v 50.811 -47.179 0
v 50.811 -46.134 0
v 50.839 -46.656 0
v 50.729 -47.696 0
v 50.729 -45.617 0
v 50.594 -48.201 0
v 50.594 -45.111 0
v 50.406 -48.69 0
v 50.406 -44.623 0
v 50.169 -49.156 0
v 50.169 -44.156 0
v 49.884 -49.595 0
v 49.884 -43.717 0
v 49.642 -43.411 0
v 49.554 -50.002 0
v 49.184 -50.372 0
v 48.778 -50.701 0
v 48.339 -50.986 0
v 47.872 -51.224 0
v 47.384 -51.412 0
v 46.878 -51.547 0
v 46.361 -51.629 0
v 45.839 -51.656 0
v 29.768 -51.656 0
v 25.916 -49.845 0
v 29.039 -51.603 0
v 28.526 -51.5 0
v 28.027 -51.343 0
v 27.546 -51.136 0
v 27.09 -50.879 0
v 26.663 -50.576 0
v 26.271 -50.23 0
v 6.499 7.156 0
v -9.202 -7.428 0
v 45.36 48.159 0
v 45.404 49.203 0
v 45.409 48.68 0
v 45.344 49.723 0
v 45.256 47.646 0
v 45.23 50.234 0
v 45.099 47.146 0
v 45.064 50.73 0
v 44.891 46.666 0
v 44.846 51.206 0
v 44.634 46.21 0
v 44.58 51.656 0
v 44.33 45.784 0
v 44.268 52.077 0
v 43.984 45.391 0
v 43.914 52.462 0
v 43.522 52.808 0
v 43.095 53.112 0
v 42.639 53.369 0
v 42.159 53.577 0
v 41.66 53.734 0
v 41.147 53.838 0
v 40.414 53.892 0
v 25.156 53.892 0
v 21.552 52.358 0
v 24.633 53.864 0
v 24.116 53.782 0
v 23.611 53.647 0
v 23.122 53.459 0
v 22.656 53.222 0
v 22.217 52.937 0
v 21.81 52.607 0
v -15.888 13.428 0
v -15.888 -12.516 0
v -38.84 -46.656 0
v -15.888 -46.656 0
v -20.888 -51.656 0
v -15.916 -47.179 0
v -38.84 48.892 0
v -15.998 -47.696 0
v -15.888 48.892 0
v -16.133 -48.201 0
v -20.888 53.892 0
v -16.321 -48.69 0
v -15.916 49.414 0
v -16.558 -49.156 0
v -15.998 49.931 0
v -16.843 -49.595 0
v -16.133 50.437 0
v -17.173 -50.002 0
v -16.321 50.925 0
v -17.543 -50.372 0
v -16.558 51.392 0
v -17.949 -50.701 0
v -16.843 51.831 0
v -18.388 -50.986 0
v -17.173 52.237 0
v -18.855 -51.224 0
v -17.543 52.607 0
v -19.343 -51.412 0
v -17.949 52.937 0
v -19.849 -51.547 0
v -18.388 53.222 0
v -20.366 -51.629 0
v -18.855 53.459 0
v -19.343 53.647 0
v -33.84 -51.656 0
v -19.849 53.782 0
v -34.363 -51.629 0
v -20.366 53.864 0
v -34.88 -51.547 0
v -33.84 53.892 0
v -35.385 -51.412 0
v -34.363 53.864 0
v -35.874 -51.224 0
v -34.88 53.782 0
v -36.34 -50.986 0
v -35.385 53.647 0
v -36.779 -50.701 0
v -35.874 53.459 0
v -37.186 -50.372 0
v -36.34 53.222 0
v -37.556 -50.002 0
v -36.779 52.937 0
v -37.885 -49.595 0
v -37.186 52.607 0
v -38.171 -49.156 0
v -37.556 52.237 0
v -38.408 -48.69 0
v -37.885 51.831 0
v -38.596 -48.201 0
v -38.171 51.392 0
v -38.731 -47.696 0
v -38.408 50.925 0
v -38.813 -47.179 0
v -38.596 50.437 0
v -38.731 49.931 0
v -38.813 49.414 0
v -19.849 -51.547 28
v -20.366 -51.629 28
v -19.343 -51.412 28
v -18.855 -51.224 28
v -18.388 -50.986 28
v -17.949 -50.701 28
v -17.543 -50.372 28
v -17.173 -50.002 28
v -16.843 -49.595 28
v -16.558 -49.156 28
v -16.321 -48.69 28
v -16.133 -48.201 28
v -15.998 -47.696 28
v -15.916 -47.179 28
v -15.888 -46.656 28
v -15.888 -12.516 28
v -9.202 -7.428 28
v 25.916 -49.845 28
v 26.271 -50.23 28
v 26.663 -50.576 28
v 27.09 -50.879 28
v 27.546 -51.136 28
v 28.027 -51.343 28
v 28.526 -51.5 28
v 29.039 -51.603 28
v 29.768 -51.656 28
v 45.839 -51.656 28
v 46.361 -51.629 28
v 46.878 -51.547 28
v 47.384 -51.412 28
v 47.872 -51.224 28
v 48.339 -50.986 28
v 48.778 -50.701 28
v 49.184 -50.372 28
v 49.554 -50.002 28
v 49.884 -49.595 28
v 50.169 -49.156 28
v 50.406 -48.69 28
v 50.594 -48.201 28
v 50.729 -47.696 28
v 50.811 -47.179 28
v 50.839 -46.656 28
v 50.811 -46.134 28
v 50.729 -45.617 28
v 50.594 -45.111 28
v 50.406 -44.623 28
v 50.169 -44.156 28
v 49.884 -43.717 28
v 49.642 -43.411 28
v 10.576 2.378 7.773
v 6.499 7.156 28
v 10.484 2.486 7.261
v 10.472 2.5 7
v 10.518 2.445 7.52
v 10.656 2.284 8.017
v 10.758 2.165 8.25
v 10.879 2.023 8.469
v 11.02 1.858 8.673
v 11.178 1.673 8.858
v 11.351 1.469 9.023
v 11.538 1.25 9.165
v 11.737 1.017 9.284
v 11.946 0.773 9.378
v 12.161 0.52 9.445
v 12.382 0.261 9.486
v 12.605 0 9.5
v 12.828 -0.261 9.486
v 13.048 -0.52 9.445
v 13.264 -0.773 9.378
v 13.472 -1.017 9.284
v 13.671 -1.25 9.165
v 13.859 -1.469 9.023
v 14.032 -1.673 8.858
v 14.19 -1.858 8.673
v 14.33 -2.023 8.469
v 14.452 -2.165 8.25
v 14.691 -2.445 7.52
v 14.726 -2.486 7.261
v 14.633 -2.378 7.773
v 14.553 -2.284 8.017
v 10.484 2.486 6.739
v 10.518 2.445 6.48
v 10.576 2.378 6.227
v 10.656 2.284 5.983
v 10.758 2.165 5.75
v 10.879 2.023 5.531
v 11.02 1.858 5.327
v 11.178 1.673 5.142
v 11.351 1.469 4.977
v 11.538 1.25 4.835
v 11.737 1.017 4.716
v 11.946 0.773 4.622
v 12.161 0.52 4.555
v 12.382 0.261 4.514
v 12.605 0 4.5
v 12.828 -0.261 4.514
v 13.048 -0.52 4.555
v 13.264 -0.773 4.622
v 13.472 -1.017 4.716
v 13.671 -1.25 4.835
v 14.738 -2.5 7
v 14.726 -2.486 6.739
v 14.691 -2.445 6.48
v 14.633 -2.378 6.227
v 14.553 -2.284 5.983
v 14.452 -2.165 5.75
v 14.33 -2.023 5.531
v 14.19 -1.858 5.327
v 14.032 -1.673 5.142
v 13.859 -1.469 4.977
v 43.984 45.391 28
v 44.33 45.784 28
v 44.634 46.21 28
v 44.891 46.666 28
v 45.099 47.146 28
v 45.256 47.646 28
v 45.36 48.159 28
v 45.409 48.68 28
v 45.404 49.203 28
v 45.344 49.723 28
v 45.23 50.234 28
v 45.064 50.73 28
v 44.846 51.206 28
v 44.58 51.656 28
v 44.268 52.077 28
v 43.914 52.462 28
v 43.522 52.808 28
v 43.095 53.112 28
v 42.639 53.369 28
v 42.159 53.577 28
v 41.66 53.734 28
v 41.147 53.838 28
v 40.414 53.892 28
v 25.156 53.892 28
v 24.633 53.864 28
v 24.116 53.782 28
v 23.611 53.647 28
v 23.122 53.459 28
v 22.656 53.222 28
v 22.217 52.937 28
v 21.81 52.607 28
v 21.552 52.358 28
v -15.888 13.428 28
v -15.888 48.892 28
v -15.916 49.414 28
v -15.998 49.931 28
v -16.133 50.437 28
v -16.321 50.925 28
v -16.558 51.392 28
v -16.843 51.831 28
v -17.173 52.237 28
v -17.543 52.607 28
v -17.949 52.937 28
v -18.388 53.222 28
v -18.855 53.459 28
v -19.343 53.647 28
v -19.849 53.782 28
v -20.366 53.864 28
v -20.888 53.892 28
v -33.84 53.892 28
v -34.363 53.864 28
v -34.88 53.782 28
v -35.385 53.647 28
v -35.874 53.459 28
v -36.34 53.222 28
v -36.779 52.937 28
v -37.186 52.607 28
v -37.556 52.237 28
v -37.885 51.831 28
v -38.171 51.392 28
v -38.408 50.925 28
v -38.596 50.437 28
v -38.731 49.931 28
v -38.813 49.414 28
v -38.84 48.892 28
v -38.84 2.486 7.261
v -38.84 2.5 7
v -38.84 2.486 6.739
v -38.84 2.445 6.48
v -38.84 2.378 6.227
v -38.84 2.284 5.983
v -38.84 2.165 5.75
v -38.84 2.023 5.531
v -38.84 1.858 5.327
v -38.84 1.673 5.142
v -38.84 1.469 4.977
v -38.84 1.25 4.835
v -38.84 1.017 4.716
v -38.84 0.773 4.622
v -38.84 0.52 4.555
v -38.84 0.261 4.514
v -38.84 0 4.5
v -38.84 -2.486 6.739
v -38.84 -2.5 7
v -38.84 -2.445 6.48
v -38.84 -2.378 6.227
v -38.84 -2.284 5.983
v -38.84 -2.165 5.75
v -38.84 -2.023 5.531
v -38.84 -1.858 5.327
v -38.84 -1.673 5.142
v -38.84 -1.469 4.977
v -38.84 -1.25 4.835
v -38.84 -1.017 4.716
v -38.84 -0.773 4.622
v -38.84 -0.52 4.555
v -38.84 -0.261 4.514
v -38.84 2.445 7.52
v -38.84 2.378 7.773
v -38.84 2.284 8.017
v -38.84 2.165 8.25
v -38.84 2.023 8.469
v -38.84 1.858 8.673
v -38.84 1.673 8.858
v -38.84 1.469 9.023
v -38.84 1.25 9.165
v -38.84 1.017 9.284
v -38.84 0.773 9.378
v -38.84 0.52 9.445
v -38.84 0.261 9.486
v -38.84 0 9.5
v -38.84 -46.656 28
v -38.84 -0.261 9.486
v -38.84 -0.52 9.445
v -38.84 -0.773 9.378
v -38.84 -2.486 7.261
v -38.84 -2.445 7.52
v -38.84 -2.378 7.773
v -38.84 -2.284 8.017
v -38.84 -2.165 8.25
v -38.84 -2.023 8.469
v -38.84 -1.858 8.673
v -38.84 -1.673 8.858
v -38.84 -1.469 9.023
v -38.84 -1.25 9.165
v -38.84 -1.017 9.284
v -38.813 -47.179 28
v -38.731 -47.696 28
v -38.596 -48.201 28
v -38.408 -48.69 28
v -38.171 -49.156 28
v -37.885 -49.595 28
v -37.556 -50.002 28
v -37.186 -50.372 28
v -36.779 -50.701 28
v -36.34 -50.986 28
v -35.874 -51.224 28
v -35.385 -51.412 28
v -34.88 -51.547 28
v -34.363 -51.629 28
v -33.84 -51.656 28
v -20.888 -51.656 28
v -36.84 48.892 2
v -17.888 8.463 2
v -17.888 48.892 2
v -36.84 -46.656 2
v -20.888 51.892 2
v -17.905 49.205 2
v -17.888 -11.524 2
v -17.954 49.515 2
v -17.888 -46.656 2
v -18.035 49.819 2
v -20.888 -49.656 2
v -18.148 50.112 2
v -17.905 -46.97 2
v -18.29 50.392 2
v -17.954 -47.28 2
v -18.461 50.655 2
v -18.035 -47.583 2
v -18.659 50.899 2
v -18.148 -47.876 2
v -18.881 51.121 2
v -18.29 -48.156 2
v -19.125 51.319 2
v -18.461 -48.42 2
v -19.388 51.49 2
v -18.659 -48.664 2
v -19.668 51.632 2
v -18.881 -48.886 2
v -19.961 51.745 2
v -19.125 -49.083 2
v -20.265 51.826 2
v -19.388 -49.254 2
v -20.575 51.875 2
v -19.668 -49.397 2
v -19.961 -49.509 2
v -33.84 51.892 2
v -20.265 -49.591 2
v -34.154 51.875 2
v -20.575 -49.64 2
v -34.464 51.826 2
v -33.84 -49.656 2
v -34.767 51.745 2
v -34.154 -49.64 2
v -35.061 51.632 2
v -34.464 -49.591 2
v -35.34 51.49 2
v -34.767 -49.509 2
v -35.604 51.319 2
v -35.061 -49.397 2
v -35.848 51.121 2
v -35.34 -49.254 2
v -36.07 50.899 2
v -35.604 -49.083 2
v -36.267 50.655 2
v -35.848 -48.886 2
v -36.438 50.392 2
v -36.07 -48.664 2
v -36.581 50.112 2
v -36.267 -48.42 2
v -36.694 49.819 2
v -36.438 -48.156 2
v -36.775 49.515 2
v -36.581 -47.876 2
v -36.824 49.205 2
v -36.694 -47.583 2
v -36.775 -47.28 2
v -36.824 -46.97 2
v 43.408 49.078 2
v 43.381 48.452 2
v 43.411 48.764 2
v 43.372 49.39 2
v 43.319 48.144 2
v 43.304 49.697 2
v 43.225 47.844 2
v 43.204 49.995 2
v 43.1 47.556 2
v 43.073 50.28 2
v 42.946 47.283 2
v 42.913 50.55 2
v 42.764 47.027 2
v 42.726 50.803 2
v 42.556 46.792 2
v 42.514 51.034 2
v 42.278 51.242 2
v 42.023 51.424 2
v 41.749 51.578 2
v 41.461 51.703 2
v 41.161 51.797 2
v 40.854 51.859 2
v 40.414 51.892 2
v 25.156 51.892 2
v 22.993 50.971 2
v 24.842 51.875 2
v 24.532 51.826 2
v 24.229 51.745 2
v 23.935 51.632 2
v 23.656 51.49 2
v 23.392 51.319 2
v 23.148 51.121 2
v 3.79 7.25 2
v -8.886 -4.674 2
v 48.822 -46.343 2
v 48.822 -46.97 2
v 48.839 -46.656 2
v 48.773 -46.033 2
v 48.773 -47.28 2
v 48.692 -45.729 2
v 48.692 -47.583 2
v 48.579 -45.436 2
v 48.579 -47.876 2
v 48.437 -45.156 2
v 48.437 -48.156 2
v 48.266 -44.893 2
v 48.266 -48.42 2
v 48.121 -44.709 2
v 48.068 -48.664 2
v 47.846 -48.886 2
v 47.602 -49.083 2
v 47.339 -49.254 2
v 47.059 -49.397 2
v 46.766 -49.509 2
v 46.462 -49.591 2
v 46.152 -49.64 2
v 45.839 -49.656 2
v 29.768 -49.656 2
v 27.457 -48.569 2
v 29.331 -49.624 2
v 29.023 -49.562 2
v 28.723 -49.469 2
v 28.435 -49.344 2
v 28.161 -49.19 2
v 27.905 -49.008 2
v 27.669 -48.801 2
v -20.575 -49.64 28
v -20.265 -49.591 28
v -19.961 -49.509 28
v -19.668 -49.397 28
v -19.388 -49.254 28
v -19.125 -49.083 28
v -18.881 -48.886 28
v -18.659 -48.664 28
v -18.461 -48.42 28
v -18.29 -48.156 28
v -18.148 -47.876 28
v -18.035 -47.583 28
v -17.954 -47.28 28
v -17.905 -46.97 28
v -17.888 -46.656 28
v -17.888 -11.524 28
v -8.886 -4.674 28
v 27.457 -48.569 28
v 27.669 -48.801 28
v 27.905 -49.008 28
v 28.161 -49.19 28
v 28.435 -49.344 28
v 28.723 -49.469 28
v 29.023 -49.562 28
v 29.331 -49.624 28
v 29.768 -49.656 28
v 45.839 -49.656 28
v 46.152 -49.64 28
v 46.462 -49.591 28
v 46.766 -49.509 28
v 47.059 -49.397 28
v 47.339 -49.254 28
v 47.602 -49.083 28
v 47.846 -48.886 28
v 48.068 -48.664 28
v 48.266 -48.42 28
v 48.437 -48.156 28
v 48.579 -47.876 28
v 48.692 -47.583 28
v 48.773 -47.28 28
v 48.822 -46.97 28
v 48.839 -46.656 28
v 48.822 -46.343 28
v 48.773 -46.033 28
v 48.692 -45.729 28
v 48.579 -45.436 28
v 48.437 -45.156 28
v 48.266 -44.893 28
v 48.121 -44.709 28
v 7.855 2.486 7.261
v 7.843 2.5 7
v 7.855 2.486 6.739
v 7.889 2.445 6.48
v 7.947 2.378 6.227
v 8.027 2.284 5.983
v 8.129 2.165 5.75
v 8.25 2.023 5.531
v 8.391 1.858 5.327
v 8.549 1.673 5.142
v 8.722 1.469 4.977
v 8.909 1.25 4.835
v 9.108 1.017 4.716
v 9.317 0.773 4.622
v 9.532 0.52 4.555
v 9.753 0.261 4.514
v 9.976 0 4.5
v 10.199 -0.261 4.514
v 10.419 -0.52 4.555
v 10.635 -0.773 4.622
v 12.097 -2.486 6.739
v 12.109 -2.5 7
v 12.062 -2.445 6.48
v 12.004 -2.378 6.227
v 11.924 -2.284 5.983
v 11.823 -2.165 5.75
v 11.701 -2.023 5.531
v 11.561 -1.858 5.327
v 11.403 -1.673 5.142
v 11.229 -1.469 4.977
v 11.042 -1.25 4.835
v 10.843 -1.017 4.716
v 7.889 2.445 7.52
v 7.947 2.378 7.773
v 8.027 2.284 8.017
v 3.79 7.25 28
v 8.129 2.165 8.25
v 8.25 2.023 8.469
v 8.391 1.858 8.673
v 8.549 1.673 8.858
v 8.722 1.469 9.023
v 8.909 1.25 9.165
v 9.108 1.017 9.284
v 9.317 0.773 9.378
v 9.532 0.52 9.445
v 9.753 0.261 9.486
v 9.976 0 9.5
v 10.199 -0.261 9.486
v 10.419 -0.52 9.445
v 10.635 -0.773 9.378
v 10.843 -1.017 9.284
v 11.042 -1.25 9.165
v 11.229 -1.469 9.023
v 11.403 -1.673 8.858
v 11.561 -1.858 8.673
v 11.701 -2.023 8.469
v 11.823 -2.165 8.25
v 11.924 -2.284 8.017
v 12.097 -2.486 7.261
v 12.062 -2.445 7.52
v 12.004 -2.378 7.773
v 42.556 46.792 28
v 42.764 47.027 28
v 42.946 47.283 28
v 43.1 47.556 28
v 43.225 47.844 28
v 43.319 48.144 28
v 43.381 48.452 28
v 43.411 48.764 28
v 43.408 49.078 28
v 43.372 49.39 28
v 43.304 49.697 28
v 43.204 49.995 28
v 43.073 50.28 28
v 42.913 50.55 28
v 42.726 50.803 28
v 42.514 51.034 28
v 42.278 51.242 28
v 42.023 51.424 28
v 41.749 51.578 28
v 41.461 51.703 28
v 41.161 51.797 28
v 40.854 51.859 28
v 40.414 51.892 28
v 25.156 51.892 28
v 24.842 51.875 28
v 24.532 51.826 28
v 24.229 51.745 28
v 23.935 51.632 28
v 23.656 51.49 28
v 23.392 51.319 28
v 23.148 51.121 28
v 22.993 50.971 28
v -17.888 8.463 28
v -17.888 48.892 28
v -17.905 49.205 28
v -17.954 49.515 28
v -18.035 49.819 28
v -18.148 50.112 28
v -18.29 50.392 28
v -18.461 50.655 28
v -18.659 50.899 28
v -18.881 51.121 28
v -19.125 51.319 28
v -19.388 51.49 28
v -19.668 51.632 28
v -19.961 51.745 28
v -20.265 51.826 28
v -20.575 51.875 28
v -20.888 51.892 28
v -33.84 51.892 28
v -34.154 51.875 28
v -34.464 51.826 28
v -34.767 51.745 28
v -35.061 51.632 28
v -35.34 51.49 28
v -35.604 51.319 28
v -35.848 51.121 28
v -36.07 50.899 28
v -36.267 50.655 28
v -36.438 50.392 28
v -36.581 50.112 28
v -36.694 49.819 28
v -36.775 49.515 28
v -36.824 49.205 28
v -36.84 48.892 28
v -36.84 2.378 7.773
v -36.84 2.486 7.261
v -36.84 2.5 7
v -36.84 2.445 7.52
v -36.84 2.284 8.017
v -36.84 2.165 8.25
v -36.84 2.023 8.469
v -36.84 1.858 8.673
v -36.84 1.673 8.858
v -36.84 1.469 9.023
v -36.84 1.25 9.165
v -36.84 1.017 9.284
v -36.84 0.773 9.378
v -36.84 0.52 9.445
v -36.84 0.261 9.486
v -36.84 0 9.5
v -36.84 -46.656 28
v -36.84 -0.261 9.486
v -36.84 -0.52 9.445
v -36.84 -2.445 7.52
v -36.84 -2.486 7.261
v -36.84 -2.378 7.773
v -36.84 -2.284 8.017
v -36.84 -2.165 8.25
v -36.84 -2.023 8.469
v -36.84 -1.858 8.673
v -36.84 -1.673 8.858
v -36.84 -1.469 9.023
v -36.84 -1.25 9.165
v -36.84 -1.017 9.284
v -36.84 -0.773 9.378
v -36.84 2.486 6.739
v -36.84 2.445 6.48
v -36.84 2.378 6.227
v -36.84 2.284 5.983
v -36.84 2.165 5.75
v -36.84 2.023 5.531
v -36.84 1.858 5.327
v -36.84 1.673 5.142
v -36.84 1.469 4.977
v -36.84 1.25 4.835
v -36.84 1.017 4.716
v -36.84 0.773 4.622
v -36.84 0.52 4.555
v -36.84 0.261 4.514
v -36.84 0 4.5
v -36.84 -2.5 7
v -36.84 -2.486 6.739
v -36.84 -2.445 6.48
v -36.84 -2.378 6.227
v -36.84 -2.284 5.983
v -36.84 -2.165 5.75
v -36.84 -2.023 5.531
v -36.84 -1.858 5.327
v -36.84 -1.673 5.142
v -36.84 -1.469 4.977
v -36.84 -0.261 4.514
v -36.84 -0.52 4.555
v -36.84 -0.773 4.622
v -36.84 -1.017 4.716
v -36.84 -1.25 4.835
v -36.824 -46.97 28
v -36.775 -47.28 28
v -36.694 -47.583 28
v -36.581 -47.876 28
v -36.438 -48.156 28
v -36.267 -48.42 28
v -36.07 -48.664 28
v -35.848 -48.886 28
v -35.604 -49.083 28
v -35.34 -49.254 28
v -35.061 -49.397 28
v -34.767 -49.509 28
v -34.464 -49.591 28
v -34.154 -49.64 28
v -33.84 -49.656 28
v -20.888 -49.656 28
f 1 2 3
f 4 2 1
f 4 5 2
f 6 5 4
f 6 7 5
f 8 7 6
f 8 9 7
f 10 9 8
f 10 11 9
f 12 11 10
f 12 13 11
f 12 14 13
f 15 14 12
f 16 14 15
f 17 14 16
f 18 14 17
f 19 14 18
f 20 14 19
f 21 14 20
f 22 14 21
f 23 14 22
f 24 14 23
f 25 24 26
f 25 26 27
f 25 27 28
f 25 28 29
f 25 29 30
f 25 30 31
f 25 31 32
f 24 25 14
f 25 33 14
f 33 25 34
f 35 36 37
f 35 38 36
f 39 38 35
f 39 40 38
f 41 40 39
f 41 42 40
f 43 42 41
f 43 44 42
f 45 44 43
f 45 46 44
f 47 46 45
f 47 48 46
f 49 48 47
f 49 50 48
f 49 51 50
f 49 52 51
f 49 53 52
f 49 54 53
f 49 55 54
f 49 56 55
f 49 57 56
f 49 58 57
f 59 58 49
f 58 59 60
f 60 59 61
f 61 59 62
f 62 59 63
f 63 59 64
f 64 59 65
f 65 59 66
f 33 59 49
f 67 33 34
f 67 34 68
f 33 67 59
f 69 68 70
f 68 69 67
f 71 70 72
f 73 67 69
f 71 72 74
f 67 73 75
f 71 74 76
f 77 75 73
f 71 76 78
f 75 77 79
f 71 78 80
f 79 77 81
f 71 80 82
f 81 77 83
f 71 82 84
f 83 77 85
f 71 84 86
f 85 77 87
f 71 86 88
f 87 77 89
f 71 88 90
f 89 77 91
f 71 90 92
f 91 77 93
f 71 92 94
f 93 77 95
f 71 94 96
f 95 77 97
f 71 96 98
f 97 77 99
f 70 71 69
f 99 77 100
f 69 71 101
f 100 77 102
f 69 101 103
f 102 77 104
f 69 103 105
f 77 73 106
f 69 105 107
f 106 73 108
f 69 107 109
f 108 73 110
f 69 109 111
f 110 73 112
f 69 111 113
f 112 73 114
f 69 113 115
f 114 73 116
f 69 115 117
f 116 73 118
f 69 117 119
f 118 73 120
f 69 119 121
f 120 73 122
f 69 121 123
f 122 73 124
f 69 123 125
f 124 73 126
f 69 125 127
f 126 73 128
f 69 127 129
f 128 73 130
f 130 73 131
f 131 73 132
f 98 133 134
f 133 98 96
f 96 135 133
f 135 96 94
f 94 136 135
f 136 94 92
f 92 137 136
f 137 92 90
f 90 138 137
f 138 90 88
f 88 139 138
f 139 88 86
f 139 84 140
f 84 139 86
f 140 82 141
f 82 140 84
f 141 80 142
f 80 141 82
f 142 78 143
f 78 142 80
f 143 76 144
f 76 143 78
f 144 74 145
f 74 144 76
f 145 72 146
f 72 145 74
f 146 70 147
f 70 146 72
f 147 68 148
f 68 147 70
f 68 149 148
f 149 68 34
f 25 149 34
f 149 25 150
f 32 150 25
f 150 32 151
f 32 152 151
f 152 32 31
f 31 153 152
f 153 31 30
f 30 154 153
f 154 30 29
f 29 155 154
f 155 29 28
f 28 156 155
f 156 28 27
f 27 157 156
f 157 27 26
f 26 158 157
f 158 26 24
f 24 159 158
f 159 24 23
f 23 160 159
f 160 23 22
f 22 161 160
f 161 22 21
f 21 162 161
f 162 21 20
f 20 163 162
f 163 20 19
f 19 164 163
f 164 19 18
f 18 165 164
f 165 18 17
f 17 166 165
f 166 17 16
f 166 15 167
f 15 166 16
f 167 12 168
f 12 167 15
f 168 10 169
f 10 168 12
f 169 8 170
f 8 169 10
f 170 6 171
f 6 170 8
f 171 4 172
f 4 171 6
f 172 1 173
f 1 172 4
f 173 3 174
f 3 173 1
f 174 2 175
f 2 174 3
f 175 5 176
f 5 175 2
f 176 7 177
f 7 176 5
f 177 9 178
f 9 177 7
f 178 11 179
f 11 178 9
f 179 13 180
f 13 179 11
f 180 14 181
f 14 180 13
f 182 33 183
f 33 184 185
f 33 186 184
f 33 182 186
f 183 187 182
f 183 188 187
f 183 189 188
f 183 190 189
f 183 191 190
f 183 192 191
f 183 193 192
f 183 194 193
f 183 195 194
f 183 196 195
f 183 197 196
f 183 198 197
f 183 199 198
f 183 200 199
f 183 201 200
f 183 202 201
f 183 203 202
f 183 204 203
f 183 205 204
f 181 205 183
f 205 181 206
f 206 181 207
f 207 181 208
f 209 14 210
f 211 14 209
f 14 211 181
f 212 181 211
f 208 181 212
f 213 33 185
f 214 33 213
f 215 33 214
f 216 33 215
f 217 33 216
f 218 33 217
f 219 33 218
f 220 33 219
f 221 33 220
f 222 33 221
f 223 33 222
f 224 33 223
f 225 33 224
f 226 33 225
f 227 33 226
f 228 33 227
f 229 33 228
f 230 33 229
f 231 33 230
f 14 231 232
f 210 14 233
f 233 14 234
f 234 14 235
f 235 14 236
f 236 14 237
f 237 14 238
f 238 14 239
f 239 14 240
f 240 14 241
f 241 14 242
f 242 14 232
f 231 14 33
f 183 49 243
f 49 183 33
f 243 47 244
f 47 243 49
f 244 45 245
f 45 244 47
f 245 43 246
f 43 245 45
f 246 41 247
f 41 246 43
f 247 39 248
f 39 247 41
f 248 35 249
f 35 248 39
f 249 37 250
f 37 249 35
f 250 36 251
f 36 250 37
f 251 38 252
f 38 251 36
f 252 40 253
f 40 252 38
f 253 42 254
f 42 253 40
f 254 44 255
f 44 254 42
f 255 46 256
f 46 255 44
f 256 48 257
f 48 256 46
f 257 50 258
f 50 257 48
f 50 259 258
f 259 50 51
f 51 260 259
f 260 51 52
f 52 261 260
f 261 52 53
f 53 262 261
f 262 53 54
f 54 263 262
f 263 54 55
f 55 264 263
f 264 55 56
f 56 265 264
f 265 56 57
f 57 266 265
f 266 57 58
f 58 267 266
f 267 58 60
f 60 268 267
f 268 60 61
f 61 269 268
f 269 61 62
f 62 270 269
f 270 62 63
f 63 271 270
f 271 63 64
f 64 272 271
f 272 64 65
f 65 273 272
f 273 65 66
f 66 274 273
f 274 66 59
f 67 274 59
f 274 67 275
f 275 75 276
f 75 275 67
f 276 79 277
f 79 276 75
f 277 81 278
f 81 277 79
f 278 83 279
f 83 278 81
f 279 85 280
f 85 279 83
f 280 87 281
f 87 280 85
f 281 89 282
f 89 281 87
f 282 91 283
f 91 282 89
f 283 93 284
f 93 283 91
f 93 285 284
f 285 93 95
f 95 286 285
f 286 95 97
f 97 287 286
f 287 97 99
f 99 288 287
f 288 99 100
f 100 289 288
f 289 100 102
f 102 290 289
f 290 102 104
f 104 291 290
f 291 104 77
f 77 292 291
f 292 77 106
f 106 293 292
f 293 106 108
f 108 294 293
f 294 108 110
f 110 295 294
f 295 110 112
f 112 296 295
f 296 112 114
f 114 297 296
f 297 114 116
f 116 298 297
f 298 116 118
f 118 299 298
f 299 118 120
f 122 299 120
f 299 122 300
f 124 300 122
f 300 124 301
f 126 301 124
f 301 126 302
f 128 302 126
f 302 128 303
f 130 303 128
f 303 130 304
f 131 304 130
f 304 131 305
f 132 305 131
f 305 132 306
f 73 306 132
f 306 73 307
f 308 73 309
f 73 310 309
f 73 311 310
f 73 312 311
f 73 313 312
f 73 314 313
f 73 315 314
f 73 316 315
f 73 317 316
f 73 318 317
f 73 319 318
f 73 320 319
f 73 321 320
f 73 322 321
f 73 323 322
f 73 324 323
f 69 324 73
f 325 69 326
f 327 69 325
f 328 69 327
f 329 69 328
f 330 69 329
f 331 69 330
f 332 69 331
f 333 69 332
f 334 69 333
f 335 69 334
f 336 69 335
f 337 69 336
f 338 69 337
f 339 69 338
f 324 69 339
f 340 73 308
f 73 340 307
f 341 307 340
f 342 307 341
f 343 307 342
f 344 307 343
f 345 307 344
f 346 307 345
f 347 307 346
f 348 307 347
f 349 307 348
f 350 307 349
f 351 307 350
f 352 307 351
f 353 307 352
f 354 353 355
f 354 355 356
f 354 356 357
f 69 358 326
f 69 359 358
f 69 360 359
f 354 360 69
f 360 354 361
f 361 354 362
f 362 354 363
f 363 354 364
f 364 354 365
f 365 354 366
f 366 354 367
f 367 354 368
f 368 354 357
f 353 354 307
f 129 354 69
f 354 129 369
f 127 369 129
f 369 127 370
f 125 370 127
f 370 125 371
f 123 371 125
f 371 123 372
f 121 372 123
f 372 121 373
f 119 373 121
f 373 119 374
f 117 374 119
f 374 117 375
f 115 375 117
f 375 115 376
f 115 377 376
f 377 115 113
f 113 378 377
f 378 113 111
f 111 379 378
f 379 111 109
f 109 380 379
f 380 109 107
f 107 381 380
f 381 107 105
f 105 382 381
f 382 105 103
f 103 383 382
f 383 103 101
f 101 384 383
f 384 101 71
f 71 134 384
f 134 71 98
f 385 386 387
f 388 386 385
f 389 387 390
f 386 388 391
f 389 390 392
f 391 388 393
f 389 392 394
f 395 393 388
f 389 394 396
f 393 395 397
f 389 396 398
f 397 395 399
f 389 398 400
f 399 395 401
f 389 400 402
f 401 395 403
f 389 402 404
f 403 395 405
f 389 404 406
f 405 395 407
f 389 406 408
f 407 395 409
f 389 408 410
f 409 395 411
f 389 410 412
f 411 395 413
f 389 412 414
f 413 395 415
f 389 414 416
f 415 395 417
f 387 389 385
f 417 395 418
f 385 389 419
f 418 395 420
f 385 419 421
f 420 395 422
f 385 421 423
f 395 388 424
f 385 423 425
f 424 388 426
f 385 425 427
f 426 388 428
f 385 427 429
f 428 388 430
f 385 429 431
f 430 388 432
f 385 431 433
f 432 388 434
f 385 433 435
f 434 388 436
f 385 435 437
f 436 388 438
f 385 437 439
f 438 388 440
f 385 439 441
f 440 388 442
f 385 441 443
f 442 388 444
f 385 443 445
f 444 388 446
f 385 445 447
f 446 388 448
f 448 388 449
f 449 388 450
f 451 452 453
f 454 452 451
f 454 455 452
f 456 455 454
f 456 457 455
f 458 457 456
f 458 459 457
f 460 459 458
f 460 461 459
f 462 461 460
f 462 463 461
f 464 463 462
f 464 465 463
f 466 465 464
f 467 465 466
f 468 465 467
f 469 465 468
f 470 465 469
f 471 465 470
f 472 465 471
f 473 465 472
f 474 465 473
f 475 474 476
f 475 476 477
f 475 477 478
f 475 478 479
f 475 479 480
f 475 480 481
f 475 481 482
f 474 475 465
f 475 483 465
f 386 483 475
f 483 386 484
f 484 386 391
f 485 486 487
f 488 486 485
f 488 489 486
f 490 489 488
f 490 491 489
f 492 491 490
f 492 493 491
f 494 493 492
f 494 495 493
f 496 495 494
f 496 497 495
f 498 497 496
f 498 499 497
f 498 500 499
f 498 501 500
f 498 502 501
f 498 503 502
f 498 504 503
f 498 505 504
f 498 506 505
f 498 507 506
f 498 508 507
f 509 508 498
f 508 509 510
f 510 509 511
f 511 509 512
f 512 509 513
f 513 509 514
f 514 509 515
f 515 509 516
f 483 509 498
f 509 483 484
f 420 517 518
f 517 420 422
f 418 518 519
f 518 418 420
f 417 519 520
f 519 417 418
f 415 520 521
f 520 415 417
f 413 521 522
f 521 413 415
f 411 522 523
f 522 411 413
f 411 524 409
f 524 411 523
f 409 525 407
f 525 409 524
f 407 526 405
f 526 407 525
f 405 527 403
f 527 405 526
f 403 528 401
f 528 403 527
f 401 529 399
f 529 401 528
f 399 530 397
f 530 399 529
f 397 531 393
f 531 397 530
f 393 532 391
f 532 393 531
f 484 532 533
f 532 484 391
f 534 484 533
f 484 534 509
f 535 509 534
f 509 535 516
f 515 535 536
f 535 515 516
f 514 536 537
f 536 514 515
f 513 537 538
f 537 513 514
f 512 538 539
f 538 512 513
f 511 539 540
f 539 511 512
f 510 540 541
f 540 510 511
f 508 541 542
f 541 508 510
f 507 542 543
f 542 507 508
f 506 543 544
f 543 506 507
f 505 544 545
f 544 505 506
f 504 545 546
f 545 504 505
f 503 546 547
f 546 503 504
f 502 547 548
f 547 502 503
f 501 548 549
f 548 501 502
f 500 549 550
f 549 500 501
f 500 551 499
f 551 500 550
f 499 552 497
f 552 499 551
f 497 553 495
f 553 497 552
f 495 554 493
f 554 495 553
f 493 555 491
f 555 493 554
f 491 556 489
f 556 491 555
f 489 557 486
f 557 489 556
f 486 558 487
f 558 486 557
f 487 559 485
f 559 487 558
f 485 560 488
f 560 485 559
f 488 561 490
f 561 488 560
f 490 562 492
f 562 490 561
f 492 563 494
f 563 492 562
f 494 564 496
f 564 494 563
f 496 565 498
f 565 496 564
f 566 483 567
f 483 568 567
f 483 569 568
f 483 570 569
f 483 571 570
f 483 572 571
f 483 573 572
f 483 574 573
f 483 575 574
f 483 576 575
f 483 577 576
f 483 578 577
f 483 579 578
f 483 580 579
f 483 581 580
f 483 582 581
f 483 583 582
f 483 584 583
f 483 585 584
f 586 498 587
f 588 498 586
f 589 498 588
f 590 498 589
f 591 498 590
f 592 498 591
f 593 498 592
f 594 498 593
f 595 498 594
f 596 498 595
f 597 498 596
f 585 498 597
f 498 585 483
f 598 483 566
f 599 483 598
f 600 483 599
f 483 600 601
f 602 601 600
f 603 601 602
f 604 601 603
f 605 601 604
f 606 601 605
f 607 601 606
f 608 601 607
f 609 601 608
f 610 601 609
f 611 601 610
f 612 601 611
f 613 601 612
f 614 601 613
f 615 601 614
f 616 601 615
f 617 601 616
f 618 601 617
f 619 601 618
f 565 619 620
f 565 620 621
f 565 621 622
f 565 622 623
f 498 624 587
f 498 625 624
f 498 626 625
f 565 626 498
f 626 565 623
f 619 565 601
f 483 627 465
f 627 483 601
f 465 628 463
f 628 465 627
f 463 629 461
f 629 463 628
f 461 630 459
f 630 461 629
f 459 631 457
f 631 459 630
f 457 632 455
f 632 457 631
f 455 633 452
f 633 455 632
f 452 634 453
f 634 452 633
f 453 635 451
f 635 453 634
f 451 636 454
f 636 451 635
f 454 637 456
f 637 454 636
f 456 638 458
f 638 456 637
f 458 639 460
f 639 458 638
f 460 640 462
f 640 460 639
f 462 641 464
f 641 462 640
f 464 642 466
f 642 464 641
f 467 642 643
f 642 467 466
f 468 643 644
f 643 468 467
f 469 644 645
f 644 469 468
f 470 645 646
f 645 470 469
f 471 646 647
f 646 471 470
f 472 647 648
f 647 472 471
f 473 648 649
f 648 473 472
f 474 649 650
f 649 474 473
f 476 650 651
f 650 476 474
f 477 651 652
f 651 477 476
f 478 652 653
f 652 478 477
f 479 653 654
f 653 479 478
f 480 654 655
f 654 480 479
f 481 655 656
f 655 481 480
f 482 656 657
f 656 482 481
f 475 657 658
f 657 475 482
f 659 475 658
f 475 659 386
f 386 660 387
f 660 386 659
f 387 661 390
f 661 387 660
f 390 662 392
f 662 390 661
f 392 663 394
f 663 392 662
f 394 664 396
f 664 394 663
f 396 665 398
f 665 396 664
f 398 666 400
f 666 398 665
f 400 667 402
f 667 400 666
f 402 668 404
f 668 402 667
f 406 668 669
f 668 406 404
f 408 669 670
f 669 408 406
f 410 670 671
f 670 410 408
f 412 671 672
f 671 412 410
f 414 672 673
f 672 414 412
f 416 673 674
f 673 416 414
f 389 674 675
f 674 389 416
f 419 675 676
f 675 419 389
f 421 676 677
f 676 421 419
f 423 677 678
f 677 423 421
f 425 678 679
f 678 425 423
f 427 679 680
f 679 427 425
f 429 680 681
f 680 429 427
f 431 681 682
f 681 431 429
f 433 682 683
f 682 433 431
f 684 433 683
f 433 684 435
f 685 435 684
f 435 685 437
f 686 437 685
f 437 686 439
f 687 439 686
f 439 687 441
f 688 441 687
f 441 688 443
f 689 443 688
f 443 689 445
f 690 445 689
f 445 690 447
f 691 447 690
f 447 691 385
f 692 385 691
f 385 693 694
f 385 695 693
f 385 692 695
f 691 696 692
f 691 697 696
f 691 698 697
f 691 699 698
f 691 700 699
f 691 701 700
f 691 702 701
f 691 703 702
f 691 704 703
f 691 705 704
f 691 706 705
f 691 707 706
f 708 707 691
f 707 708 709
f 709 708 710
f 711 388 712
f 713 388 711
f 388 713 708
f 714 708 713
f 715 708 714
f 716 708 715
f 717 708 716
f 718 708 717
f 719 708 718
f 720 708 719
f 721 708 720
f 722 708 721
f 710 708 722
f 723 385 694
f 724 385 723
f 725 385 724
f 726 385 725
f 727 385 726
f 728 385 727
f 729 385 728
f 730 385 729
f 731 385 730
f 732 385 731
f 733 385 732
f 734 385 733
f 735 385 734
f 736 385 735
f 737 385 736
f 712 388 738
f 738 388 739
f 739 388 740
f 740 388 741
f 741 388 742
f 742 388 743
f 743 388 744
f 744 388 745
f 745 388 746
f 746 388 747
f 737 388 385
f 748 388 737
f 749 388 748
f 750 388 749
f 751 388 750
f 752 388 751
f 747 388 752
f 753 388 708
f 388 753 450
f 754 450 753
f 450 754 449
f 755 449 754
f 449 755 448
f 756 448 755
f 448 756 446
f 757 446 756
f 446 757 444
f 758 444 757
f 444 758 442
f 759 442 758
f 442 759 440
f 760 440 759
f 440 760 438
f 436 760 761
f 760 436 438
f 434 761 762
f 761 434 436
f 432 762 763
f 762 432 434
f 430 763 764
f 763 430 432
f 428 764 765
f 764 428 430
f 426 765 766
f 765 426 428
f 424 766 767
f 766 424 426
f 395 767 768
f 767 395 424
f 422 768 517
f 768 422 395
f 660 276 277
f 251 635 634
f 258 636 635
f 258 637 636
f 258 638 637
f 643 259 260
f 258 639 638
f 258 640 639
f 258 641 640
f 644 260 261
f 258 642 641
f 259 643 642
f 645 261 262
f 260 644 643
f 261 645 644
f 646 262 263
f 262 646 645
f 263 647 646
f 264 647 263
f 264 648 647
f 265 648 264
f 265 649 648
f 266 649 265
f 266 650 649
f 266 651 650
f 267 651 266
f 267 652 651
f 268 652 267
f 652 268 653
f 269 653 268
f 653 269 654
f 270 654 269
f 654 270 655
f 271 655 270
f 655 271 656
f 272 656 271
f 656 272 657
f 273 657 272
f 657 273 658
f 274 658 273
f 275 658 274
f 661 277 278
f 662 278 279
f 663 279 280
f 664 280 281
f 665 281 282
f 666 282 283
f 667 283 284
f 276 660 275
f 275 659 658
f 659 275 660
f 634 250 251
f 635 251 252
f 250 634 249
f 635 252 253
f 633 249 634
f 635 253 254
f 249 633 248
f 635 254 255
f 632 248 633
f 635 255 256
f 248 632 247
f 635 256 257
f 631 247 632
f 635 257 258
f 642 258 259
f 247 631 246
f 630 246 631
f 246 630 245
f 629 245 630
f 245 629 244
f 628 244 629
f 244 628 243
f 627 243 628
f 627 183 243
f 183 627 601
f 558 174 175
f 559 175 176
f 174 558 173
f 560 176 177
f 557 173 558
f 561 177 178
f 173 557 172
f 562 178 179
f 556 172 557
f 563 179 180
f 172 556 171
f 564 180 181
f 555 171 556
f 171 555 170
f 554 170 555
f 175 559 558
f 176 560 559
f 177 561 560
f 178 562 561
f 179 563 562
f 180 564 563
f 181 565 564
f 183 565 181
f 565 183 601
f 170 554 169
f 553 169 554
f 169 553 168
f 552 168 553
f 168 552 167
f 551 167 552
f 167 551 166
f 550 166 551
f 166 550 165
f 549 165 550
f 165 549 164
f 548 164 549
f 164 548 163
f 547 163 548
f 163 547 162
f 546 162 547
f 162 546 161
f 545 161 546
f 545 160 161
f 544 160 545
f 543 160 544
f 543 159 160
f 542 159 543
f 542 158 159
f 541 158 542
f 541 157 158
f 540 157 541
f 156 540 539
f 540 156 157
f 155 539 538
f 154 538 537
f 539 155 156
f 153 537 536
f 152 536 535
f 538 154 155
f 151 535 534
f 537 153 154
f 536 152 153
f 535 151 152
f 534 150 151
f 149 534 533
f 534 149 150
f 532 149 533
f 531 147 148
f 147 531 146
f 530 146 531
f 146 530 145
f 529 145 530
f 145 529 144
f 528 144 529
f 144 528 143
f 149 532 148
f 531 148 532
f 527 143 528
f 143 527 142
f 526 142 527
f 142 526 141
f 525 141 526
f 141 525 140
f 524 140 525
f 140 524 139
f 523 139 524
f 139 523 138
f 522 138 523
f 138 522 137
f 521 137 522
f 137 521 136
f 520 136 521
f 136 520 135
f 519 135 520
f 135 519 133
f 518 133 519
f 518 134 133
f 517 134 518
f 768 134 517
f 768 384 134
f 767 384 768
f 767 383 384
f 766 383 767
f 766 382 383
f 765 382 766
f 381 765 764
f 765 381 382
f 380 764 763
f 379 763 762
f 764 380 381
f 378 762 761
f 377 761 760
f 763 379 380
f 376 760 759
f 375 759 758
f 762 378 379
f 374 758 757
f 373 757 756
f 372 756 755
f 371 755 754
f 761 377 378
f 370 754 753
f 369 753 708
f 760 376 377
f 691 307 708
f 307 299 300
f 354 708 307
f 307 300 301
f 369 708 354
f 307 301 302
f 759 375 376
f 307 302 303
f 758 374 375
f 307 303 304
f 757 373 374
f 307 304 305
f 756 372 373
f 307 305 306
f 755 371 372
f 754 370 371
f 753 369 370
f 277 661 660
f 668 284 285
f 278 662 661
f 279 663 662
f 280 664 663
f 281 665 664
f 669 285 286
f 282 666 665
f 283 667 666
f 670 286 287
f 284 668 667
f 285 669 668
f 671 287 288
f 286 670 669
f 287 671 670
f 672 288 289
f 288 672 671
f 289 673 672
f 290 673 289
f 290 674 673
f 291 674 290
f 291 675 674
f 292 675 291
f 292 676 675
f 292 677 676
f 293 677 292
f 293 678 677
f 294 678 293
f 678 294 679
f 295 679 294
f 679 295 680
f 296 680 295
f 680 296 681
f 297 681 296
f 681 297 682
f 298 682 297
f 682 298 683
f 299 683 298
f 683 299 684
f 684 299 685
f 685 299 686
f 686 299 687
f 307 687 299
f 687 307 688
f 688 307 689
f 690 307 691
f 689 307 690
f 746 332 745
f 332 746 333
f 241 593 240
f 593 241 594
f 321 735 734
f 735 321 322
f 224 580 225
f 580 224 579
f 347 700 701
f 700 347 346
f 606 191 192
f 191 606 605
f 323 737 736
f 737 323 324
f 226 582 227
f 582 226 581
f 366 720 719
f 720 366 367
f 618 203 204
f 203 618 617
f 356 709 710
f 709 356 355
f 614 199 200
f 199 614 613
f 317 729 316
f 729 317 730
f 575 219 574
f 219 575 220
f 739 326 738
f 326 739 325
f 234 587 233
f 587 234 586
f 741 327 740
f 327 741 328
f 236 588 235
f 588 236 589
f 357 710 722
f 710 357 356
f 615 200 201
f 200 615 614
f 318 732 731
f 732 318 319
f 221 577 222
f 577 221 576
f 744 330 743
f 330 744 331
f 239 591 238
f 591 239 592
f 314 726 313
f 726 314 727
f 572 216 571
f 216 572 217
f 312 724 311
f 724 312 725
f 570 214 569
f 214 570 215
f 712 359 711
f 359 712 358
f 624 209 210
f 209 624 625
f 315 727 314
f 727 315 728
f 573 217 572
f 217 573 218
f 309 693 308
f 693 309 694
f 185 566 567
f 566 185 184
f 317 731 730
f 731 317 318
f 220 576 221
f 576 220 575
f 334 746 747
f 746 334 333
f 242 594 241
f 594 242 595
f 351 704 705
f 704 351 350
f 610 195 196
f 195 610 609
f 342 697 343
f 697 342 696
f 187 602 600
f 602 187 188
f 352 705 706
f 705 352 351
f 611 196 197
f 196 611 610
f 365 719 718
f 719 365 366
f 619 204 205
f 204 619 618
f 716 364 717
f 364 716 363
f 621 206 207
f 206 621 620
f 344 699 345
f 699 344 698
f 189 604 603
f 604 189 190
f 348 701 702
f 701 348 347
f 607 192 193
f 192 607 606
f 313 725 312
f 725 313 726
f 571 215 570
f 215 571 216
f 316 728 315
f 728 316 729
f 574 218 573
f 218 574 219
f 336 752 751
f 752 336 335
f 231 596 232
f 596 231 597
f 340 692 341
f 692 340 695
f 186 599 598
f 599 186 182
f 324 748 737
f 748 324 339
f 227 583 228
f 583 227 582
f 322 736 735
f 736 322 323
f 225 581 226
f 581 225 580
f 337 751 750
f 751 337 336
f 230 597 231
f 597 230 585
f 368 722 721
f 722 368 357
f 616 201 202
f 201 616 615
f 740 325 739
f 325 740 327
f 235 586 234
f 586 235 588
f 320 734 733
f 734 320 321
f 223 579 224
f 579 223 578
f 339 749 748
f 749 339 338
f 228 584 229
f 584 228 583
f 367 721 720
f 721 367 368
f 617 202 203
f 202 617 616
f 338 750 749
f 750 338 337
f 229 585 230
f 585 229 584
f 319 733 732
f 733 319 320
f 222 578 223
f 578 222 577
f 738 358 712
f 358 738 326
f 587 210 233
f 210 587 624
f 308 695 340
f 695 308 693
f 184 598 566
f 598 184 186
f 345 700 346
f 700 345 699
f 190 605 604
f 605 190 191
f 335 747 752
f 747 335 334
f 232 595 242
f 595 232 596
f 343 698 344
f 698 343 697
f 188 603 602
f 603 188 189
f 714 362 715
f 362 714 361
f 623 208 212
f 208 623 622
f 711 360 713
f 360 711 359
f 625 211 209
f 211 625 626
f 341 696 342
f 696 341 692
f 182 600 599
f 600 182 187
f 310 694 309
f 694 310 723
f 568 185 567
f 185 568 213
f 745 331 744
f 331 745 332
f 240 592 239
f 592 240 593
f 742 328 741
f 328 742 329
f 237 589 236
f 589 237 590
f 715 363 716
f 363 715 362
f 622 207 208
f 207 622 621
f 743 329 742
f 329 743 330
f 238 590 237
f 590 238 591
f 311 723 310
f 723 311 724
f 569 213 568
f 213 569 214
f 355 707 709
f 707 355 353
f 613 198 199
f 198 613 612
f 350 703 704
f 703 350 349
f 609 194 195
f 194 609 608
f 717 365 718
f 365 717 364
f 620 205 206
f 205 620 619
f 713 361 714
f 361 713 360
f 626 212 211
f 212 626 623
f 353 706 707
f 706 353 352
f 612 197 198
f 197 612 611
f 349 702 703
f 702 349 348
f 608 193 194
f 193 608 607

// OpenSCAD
// AUTOMATICALLY GENERATED FILE: Letter_K
// SIGN SCULPTOR ENGINE V2

Render_Mode = "Body"; // Set to "Lid" to export the cover
Letter = "K";
Font_Size = 100;
Font_Name = "Arial:style=Black";
Light_Type = "Silicone_Neon_6mm";

// -- Engineering Constants --
Sign_Height = 30.0;
Wall_Thickness = 2.0;
Base_Thickness = 2.0;
Lid_Tolerance = 0.15;
Hole_Height = 5.0;
Hole_Size = 5.0;

// -- Logic Engine --
CW = (Light_Type == "Silicone_Neon_6mm") ? 6.0 :
     (Light_Type == "Silicone_Neon_8mm") ? 8.0 :
     (Light_Type == "LED_Strip_10mm")    ? 10.5 :
     (Light_Type == "Individual_Pixels")  ? 14.0 : 6.0;

Lip_Overhang = (Light_Type == "Silicone_Neon_6mm" || Light_Type == "Silicone_Neon_8mm") ? 0.4 : 0.0;

$fn = 60;

module letter_shape() {
    text(text=Letter, size=Font_Size, font=Font_Name, halign="center", valign="center");
}

module body_geometry() {
    difference() {
        // 1. Positive Block
        linear_extrude(Sign_Height)
            offset(r = CW/2 + Wall_Thickness)
            letter_shape();

        // 2. Light Channel
        translate([0,0, Base_Thickness])
            linear_extrude(Sign_Height + 1)
            offset(r = CW/2)
            letter_shape();

        // 3. Friction Lip
        if (Lip_Overhang > 0) {
            translate([0,0, Sign_Height - 2.0])
                linear_extrude(3.0)
                difference() {
                    offset(r = CW/2 + 5) letter_shape();
                    offset(r = CW/2 - Lip_Overhang) letter_shape();
                }
        }
        
        // 4. Lid Shelf
        translate([0,0, Sign_Height - 2.0])
            linear_extrude(3.0)
            offset(r = CW/2 + 1.5)
            letter_shape();

        // 5. WIRE CHANNELS (Dynamic Side Holes)
        // Left Hole
        translate([-Font_Size/1.8, 0, Hole_Height + Base_Thickness])
            rotate([0, 90, 0])
            cylinder(h = Font_Size, r = Hole_Size/2);
            
        // Right Hole
        translate([Font_Size/1.8, 0, Hole_Height + Base_Thickness])
            rotate([0, -90, 0])
            cylinder(h = Font_Size, r = Hole_Size/2);
    }
}

module lid_geometry() {
    color("White")
        linear_extrude(2.0)
        offset(r = (CW/2 + 1.5) - Lid_Tolerance)
        letter_shape();
}

// Render Controller
if (Render_Mode == "Body") {
    body_geometry();
} else if (Render_Mode == "Lid") {
    lid_geometry();
}
